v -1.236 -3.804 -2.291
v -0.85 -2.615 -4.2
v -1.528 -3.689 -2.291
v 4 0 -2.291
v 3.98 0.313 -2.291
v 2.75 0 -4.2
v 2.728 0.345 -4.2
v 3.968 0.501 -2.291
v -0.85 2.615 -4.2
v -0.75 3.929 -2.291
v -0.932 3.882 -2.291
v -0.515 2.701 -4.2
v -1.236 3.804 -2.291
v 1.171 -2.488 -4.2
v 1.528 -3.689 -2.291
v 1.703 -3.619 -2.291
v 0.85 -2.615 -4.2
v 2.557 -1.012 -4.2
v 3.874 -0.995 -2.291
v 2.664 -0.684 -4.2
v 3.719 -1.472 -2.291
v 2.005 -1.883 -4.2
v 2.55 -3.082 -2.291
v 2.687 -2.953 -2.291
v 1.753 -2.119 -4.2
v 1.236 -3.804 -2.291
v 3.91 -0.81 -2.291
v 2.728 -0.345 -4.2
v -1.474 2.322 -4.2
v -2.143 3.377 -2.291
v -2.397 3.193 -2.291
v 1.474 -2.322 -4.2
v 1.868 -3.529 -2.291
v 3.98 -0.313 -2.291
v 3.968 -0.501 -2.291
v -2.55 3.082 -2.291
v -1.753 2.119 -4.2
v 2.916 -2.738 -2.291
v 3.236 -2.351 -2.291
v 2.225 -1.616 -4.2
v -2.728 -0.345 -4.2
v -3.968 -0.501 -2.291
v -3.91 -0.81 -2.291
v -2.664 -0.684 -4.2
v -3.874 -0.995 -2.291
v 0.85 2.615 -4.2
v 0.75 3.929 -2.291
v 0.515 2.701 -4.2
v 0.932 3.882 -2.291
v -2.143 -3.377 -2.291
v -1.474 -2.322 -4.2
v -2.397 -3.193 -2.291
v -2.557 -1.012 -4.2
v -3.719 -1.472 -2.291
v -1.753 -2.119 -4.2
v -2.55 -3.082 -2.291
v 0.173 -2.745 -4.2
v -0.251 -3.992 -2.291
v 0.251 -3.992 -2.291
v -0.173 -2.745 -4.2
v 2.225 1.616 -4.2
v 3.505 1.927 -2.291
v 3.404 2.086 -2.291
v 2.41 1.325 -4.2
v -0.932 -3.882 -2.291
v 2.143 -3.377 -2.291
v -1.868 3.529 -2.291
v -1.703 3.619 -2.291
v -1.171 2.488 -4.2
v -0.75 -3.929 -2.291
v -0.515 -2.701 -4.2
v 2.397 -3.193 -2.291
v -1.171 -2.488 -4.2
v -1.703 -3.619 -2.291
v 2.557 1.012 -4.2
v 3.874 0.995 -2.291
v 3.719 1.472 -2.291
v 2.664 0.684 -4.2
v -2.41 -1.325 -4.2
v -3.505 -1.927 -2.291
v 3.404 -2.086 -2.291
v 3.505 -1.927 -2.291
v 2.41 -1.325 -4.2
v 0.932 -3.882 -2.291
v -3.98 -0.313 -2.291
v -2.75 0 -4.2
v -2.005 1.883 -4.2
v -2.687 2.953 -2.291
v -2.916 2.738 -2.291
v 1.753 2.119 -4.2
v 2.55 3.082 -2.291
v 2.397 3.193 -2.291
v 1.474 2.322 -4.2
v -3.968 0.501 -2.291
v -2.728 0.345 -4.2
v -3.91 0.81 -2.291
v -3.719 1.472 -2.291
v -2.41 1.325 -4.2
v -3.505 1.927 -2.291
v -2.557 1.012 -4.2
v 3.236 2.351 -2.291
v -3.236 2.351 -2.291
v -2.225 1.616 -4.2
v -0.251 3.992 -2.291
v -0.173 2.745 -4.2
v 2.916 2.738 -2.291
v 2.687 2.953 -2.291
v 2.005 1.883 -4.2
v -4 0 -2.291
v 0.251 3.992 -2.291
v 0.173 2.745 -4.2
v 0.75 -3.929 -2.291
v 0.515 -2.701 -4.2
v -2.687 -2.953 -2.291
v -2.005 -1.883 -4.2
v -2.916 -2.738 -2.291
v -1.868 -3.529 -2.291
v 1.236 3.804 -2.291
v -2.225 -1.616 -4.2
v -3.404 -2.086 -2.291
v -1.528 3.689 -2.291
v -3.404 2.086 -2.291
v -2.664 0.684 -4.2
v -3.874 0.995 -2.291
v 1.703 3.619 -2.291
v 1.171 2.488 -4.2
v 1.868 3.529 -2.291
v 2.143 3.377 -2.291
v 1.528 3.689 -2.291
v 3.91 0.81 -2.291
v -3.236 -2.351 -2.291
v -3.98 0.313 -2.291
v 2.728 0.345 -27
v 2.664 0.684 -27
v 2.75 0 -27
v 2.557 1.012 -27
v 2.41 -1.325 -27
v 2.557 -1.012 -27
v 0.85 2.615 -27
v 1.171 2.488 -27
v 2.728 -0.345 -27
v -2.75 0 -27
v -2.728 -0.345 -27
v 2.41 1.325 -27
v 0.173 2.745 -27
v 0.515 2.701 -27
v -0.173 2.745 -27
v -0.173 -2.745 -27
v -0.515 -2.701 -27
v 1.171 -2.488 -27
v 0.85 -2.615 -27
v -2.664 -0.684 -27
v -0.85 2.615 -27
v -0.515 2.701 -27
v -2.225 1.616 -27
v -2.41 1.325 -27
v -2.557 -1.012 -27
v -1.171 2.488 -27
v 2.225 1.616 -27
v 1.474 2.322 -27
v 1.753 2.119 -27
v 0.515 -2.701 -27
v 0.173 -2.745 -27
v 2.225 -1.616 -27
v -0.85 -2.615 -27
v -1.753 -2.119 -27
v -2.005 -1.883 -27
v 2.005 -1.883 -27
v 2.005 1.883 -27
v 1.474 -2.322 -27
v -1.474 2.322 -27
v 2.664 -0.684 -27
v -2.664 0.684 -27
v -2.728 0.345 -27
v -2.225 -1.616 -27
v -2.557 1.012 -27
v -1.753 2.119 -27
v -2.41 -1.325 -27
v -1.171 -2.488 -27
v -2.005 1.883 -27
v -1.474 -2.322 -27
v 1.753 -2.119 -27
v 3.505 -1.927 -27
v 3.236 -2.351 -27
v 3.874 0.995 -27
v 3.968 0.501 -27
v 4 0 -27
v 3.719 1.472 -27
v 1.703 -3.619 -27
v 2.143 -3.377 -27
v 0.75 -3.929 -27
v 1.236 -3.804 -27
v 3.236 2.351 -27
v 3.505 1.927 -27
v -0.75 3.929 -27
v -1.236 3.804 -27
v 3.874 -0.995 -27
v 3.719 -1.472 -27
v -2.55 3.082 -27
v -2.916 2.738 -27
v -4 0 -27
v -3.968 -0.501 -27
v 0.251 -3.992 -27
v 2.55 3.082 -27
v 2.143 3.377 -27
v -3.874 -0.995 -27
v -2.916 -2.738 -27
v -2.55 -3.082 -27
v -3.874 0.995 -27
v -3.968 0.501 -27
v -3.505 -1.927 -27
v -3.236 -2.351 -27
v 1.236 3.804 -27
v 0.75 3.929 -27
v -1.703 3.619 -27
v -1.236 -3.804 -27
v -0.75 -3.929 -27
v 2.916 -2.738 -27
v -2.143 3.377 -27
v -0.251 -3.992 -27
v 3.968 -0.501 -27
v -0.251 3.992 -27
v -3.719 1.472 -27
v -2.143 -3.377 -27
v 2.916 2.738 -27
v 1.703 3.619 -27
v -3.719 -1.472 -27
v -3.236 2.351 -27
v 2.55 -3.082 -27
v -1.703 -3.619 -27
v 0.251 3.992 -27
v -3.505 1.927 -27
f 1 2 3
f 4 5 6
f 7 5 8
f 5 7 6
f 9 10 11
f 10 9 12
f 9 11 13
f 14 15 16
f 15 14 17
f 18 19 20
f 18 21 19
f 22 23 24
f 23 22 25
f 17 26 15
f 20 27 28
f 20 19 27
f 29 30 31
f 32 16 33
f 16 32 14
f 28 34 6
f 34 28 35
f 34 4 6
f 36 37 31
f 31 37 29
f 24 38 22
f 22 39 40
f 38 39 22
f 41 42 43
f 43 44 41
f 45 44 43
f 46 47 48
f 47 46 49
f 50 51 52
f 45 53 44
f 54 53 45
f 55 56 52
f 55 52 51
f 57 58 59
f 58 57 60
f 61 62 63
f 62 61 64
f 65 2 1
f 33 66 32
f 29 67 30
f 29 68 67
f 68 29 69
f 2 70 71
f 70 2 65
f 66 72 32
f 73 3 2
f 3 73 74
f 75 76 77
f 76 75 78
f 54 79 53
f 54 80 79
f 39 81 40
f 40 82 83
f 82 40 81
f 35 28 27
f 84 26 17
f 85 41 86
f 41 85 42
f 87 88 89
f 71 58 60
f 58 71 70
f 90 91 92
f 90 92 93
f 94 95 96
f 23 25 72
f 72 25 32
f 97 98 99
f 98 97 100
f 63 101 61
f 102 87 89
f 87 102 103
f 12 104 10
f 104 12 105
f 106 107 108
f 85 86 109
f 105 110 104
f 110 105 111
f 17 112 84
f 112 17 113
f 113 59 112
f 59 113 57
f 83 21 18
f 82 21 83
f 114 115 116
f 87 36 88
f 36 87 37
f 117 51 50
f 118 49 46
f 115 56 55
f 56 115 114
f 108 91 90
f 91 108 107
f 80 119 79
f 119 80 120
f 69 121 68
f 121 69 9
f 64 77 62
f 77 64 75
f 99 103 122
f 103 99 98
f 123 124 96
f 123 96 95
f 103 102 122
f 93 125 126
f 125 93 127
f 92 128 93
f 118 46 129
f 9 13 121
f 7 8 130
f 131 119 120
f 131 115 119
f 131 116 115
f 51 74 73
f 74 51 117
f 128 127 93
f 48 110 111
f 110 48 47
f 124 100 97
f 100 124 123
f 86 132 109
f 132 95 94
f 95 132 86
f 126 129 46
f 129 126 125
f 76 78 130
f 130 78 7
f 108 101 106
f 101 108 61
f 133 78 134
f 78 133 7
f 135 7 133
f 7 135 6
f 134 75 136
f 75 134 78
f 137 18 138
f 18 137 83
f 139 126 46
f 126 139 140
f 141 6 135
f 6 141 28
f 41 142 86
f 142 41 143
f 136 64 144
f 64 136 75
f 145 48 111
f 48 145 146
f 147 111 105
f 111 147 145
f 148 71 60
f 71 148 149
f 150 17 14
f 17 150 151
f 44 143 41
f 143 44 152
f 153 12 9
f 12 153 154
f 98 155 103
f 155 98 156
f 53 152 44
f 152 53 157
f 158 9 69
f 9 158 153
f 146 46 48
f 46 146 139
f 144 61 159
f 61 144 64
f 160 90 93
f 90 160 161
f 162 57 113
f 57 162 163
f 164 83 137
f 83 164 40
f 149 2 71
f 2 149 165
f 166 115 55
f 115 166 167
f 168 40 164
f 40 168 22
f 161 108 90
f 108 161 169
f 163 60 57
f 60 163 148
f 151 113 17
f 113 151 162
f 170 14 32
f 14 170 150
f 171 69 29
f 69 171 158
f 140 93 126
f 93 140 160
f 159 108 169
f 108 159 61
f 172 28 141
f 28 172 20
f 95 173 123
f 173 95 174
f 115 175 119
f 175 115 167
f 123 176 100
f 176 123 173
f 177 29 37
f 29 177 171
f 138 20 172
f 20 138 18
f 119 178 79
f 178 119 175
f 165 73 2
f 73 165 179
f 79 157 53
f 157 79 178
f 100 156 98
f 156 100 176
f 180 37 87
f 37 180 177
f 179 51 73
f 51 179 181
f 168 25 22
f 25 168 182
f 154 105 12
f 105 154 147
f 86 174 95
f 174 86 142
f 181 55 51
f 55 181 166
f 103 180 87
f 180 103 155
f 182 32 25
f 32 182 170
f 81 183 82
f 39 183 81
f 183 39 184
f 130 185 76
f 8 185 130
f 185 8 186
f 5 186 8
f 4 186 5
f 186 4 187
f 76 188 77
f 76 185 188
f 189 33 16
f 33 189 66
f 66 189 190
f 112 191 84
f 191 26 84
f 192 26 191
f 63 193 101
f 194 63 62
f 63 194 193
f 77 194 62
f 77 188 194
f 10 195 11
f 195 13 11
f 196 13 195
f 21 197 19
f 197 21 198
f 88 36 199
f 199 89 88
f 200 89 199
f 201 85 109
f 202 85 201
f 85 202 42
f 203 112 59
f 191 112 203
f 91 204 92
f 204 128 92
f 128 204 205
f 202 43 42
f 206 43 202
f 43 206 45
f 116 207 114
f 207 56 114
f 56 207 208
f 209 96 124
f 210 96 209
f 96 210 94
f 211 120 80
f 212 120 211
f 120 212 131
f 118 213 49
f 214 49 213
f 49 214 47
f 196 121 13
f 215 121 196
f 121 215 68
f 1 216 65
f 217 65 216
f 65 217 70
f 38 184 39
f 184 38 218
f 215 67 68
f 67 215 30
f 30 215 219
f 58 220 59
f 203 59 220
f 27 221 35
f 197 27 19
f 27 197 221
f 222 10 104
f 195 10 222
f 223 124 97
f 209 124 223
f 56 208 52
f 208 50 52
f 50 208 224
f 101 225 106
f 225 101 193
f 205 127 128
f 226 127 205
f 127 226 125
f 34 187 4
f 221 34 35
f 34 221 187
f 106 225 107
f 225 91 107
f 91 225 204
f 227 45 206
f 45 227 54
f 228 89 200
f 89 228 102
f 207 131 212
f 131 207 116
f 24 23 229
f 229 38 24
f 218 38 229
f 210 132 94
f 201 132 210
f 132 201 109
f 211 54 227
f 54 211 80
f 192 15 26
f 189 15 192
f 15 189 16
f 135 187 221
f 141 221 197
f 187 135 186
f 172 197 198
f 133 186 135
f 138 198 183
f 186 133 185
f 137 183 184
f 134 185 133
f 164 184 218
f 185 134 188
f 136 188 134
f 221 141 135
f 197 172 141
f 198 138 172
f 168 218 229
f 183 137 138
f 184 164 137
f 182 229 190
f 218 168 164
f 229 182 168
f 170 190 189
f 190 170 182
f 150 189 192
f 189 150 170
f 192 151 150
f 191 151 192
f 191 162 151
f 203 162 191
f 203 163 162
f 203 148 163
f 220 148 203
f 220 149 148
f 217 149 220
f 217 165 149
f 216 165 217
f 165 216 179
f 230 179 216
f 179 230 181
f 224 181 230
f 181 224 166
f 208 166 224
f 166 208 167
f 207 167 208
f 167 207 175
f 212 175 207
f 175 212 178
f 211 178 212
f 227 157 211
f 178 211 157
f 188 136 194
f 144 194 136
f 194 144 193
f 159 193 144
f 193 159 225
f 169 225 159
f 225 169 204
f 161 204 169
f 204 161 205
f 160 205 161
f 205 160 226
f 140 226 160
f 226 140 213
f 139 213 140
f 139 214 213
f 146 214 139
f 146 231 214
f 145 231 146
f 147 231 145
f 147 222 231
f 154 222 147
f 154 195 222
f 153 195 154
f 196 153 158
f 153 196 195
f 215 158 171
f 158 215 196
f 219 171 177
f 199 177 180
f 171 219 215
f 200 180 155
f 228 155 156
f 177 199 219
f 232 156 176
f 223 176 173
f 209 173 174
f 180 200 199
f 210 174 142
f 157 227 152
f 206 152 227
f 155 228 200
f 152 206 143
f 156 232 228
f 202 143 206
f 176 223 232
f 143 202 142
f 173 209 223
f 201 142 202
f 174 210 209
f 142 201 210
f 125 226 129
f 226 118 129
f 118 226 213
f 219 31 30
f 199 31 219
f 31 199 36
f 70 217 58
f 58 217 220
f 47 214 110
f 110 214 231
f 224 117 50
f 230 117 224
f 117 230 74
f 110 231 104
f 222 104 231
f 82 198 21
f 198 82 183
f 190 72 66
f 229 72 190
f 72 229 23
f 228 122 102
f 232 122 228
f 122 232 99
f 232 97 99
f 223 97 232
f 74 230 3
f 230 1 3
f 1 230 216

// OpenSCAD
$fn = 50;

difference() {
	union() {
		translate(v = [0, 0, -27.0]) {
			cylinder(h = 27, r = 4.0);
		}
	}
	union() {
		translate(v = [0, 0, 0]) {
			rotate(a = [0, 0, 0]) {
				difference() {
					union() {
						translate(v = [0, 0, -30.0]) {
							cylinder(h = 30, r = 2.25);
						}
						translate(v = [0, 0, -4.2]) {
							cylinder(h = 4.2, r1 = 2.75, r2 = 5.5);
						}
						translate(v = [0, 0, -30.0]) {
							cylinder(h = 30, r = 2.75);
						}
						translate(v = [0, 0, -30.0]) {
							cylinder(h = 30, r = 2.25);
						}
					}
					union();
				}
			}
		}
	}
}
